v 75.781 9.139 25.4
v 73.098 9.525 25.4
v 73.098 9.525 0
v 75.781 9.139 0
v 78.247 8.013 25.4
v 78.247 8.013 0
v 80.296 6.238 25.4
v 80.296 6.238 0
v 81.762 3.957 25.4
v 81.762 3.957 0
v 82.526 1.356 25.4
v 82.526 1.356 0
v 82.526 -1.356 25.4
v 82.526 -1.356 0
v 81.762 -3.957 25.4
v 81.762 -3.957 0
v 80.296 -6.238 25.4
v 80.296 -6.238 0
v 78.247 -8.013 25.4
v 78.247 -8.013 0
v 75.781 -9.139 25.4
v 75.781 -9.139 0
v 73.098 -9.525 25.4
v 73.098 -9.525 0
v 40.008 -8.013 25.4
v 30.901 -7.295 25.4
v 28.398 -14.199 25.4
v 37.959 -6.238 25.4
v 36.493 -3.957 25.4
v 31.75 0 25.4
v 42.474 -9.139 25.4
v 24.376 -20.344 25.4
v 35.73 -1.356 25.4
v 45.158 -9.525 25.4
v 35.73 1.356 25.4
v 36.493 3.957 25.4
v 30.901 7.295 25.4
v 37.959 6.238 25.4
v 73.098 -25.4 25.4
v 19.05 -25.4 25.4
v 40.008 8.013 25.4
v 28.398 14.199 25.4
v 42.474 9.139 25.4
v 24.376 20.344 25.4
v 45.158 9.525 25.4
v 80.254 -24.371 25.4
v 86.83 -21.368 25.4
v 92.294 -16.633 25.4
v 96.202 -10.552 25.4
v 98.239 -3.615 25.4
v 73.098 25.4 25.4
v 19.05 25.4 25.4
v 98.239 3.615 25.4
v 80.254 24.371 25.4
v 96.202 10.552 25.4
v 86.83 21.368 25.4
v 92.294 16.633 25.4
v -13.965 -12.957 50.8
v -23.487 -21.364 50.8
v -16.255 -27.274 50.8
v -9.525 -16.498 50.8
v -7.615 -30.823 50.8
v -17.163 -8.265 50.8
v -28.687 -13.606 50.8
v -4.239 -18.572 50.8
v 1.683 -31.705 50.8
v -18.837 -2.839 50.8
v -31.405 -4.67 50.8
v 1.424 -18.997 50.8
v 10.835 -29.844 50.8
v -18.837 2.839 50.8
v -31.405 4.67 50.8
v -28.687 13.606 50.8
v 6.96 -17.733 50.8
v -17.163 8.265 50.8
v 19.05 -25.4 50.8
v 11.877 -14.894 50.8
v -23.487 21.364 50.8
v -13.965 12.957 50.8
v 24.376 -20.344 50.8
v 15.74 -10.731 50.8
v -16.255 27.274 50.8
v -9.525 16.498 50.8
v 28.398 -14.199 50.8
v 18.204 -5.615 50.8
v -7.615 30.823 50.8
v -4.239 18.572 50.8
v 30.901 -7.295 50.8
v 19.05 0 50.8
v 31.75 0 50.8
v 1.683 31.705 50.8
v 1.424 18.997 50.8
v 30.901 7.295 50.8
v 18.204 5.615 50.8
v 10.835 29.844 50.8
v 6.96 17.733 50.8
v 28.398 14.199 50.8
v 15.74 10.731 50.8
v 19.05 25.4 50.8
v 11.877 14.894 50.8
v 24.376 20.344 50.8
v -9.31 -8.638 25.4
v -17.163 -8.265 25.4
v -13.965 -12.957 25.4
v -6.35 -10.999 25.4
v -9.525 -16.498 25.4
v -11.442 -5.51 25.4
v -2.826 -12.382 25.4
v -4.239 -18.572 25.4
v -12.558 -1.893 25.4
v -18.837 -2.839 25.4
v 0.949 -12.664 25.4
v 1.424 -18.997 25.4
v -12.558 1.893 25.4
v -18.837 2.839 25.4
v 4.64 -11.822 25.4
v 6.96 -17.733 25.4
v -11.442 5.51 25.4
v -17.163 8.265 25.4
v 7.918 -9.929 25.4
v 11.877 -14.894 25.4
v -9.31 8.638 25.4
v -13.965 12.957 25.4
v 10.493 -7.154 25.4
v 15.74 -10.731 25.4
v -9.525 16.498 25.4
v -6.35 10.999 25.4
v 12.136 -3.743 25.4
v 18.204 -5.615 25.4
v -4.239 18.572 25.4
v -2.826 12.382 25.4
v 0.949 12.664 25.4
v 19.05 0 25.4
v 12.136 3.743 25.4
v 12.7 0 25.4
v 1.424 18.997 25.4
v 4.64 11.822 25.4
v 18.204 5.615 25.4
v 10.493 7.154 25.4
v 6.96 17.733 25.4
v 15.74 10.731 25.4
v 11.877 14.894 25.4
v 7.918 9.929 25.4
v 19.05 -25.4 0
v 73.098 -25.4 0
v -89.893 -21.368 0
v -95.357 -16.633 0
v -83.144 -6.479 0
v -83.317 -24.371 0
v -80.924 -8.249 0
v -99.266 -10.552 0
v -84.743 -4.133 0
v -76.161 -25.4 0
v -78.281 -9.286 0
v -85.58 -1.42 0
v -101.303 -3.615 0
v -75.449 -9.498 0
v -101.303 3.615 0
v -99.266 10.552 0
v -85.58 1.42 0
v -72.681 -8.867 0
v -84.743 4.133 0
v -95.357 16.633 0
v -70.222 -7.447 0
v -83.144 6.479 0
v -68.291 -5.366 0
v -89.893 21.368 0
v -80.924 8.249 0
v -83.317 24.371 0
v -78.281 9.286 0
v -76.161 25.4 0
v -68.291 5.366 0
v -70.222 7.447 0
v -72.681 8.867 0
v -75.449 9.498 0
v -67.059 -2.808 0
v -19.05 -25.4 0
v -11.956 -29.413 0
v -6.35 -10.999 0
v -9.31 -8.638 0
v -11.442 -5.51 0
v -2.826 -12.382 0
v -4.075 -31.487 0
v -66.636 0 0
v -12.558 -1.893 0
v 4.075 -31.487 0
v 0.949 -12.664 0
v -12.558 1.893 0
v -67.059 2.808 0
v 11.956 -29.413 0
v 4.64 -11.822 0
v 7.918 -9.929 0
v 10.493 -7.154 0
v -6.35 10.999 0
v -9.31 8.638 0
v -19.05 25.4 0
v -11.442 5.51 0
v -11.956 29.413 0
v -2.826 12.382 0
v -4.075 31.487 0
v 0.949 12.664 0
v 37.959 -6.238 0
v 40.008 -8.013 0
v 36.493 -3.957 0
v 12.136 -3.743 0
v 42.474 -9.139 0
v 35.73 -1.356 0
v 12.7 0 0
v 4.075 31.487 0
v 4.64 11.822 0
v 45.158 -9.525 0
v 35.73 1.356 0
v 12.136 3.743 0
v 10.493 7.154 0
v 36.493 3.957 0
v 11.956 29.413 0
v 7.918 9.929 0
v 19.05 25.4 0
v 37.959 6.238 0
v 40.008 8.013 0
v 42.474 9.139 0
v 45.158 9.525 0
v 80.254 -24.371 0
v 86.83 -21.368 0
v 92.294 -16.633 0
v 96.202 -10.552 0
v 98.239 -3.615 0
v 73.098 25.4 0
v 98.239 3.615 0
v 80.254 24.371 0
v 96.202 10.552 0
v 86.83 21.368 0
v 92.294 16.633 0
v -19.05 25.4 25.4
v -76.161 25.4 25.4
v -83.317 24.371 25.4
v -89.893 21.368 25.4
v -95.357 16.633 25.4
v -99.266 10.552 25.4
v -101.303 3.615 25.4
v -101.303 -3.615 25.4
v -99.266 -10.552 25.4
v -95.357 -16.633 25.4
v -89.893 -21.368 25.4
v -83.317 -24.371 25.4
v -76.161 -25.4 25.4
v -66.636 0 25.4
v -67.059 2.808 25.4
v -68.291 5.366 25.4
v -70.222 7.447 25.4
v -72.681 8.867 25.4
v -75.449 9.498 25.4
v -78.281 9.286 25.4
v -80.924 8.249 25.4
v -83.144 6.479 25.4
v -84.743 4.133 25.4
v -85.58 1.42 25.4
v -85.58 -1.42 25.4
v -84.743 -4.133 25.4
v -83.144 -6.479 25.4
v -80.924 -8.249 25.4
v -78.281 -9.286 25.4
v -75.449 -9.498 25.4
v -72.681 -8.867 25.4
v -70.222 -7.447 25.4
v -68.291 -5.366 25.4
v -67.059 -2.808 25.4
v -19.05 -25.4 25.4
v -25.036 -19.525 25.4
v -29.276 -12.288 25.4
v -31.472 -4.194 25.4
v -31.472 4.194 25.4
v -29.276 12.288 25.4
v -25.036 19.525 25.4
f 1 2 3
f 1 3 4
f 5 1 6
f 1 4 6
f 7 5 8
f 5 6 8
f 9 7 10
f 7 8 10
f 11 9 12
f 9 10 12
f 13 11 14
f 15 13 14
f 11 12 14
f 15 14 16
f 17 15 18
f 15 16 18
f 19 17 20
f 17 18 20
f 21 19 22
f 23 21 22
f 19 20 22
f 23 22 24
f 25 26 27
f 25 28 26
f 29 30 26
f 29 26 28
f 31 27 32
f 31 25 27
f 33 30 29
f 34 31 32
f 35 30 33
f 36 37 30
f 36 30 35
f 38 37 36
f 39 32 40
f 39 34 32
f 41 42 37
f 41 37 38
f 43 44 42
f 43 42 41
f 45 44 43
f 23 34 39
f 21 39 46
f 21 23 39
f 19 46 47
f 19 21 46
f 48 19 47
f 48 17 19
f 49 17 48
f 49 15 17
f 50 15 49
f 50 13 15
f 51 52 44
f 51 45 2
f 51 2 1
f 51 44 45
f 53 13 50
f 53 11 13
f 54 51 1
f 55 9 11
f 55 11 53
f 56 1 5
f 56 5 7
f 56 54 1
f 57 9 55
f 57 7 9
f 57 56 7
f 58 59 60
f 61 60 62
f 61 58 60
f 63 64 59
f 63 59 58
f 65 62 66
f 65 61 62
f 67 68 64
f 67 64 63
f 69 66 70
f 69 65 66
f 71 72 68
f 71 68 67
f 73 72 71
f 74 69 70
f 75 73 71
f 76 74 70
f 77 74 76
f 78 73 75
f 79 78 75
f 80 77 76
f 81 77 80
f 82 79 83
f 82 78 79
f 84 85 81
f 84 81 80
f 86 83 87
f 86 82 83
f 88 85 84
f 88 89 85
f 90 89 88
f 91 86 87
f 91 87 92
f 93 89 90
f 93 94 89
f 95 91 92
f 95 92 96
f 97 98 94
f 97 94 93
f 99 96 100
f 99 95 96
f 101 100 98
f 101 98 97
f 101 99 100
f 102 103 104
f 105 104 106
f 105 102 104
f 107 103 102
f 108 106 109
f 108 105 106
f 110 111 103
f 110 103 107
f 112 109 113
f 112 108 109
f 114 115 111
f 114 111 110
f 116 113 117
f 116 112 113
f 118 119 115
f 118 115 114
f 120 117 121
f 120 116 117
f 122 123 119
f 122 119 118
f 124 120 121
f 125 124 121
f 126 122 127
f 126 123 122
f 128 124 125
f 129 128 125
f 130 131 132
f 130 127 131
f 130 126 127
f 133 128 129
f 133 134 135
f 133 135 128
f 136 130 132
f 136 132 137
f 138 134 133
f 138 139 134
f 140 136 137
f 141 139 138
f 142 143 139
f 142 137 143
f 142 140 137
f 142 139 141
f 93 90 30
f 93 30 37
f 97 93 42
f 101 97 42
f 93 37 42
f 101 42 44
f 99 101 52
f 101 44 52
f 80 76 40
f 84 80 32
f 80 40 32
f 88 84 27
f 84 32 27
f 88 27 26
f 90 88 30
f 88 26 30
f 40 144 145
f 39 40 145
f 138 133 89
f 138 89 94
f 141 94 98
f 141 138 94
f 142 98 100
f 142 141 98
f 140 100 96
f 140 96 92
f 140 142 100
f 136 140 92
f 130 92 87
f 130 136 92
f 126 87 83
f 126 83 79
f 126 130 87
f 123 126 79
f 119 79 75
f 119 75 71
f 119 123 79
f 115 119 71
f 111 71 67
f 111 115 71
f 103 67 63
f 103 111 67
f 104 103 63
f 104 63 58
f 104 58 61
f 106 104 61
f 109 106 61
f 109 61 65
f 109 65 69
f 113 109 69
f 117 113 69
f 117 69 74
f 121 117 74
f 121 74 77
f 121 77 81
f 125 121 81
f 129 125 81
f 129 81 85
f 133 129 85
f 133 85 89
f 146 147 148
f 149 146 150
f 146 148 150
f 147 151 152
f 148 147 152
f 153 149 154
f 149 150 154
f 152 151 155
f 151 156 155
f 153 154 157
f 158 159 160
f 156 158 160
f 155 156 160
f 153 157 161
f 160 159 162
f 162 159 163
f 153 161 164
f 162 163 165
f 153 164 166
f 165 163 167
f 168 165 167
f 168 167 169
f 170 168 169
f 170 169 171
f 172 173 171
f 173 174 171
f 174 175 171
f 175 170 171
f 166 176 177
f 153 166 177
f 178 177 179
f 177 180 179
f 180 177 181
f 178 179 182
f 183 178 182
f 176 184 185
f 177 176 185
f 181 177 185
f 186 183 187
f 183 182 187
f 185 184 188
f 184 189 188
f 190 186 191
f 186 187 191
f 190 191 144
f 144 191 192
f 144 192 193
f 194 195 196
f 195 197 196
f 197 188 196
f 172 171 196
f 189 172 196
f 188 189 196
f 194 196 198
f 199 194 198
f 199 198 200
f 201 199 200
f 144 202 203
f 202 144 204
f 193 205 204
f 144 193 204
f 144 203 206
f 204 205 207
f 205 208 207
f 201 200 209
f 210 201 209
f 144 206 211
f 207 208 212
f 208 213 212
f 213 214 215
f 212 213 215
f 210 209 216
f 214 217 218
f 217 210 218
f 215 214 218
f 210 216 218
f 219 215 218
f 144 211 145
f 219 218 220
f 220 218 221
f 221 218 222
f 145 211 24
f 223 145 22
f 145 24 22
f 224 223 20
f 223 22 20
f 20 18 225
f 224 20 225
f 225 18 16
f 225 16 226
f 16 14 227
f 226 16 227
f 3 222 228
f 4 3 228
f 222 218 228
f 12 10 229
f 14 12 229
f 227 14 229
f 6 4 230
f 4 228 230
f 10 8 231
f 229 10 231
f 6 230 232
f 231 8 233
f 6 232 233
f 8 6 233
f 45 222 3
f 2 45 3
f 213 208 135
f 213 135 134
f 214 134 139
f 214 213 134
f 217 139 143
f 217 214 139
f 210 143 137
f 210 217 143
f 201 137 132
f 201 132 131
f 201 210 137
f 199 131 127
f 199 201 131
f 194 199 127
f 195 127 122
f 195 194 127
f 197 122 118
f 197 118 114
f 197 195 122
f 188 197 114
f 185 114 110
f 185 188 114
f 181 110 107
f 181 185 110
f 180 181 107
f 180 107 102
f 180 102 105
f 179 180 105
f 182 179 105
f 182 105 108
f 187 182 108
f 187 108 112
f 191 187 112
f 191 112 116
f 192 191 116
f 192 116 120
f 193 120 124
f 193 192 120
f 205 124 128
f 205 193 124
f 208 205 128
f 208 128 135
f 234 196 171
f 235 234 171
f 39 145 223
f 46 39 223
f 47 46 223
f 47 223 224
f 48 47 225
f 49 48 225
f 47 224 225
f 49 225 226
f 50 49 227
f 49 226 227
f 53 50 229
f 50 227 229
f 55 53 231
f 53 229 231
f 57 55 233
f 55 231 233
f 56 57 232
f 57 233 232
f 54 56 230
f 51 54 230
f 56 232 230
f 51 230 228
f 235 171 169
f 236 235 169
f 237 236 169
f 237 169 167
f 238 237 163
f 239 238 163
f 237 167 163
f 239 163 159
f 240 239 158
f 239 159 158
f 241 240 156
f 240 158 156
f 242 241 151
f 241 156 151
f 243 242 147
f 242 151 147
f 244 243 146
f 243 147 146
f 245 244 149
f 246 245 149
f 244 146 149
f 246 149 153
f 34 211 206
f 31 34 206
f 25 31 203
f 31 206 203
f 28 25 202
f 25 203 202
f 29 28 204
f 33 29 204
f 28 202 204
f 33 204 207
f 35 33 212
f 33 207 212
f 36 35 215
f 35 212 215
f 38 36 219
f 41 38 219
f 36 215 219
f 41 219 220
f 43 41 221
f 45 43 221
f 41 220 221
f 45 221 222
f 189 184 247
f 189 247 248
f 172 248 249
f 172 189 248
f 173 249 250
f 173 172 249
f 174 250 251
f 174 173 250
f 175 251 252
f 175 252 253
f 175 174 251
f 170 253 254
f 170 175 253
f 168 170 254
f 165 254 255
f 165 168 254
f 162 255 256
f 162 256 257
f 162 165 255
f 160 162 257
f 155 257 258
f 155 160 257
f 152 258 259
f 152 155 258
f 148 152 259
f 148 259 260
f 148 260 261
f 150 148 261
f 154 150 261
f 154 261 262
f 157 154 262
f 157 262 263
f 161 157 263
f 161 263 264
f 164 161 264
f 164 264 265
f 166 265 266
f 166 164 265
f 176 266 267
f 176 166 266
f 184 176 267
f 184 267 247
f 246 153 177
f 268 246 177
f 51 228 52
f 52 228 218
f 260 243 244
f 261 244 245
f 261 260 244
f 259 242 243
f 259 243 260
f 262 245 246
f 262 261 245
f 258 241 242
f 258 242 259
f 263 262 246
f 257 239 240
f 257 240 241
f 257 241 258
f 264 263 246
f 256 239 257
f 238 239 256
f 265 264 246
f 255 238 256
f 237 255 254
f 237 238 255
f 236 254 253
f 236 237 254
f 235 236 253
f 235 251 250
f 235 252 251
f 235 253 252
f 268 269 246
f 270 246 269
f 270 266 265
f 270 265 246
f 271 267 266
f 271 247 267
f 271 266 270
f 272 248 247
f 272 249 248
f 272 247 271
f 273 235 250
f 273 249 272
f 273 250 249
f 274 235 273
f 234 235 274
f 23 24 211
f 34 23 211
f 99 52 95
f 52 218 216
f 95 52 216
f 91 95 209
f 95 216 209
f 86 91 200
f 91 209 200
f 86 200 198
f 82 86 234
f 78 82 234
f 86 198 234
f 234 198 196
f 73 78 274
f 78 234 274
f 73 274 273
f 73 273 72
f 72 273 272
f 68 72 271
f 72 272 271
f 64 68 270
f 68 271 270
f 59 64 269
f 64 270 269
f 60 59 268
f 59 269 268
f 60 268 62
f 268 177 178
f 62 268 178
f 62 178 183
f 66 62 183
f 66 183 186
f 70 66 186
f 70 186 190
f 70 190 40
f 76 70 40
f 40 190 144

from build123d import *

# Parameters (mm, degrees)
F0_R     = 19.05
F1_DEPTH = 50.8
F0_R_2   = 9.525
F2_DEPTH = 25.4
F3_DEPTH = 25.4
F0_R_3   = 12.7
F4_DEPTH = 25.4


with BuildPart() as f1:
    # F0 (on Top) → F1 (new body)
    with BuildSketch(Plane.XY):
        with BuildLine():
            ThreePointArc((19.05, -25.4), (28.398063, -14.199032), (31.75, 0))
            ThreePointArc((31.75, 0), (28.398063, 14.199032), (19.05, 25.4))
            ThreePointArc((19.05, 25.4), (0, 31.75), (-19.05, 25.4))
            ThreePointArc((-19.05, 25.4), (-31.75, 0), (-19.05, -25.4))
            ThreePointArc((-19.05, -25.4), (0, -31.75), (19.05, -25.4))
        make_face()
        Circle(F0_R, mode=Mode.SUBTRACT)
    extrude(amount=F1_DEPTH)

    # F0 (on Top) → F2 (join)
    with BuildSketch(Plane.XY):
        with BuildLine():
            ThreePointArc((-19.05, -25.4), (-31.75, 0), (-19.05, 25.4))
            Line((-19.05, 25.4), (-76.161206, 25.4))
            ThreePointArc((-76.161206, 25.4), (-101.561206, 0), (-76.161206, -25.4))
            Line((-76.161206, -25.4), (-19.05, -25.4))
        make_face()
        with Locations((-76.161206, 0)):
            Circle(F0_R_2, mode=Mode.SUBTRACT)
    extrude(amount=F2_DEPTH)

    # F0 (on Top) → F3 (join)
    with BuildSketch(Plane.XY):
        with BuildLine():
            ThreePointArc((19.05, 25.4), (28.398063, 14.199032), (31.75, 0))
            ThreePointArc((31.75, 0), (28.398063, -14.199032), (19.05, -25.4))
            Line((19.05, -25.4), (73.097611, -25.4))
            ThreePointArc((73.097611, -25.4), (98.497611, 0), (73.097611, 25.4))
            Line((73.097611, 25.4), (19.05, 25.4))
        make_face()
        with BuildLine():
            ThreePointArc((73.097611, 9.525), (82.622611, 0), (73.097611, -9.525))
            Line((73.097611, -9.525), (45.157611, -9.525))
            ThreePointArc((45.157611, -9.525), (35.632611, 0), (45.157611, 9.525))
            Line((45.157611, 9.525), (73.097611, 9.525))
        make_face(mode=Mode.SUBTRACT)
    extrude(amount=F3_DEPTH)

    # F0 (on Top) → F4 (join)
    with BuildSketch(Plane.XY):
        Circle(F0_R)
        Circle(F0_R_3, mode=Mode.SUBTRACT)
    extrude(amount=F4_DEPTH)


solid = f1.part
